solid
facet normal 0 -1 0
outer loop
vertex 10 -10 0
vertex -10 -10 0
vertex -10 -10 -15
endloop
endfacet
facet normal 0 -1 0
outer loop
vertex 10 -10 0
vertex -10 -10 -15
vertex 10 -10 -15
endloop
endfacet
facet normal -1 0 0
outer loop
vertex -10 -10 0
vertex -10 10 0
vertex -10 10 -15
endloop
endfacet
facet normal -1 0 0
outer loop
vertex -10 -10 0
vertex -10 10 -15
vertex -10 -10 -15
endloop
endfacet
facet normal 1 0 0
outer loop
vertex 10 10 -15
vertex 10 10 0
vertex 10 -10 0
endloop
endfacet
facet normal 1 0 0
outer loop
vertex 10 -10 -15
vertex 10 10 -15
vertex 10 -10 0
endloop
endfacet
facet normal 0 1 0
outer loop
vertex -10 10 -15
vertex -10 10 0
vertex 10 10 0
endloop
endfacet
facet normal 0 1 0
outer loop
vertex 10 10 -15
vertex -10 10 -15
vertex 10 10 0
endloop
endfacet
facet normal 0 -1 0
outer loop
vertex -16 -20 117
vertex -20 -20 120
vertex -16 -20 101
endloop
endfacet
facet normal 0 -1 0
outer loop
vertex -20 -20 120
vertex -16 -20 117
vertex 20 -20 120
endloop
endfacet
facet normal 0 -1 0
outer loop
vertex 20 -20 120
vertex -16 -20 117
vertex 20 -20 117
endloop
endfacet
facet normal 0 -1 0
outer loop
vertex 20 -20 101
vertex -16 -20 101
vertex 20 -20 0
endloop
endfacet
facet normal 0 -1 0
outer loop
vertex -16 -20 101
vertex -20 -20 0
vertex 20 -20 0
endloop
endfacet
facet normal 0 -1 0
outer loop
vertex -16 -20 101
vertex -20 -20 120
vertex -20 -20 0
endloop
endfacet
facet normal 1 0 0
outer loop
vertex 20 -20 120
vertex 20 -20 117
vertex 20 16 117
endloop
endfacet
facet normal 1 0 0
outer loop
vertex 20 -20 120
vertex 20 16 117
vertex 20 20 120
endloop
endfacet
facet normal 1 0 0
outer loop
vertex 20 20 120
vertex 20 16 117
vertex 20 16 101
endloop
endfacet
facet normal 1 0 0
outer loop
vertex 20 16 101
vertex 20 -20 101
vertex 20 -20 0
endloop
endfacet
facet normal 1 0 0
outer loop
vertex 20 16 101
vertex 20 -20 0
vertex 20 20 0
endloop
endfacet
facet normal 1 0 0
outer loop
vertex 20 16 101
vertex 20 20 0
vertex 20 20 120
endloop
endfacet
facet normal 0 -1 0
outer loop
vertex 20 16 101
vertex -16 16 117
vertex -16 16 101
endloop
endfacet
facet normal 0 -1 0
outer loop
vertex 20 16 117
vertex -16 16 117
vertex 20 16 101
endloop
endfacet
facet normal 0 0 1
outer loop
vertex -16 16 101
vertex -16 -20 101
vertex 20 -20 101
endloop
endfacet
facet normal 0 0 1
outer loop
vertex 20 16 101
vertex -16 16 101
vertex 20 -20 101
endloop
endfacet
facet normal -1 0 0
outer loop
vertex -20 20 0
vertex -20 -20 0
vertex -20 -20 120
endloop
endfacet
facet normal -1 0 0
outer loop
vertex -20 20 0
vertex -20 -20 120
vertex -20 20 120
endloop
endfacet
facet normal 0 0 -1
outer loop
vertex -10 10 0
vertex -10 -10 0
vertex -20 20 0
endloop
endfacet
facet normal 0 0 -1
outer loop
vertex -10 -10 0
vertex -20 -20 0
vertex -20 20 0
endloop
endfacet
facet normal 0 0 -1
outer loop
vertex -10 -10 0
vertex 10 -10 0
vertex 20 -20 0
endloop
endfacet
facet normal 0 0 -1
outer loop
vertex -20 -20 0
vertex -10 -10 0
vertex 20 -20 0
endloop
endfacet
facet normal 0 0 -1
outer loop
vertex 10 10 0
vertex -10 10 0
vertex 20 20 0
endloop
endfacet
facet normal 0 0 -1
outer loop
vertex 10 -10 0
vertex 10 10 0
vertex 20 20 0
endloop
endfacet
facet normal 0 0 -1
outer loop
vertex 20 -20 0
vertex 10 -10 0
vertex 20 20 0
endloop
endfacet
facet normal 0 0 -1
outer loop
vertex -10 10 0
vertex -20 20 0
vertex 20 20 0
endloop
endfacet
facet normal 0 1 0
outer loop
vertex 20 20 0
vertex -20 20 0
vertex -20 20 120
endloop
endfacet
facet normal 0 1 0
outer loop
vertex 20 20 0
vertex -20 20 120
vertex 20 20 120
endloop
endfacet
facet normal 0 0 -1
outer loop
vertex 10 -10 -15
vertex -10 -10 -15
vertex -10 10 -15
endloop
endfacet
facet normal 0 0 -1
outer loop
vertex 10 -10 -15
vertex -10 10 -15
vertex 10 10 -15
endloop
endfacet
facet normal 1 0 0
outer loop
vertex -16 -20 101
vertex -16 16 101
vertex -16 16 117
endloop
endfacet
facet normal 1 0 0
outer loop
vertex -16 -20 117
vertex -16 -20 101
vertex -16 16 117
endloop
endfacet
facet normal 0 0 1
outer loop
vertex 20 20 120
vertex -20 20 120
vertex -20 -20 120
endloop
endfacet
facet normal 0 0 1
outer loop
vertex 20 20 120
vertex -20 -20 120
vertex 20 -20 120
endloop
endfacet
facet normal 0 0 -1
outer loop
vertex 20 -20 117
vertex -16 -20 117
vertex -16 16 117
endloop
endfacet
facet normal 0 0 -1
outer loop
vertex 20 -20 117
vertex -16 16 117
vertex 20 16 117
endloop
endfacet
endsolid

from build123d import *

# Parameters (mm, degrees)
F0_W     = 40
F0_H     = 40
F1_DEPTH = 120
F2_W     = 36
F2_H     = 16
F3_DEPTH = 36
F4_W     = 20
F4_H     = 20
F5_DEPTH = 15


with BuildPart() as f1:
    # F0 (on Top) → F1 (new body)
    with BuildSketch(Plane.XY):
        Rectangle(F0_W, F0_H)
    extrude(amount=F1_DEPTH)

    # F2 (on face) → F3 (cut)
    with BuildSketch(Plane.XZ.offset(20)):
        with Locations((2, 109)):
            Rectangle(F2_W, F2_H)
    extrude(amount=-F3_DEPTH, mode=Mode.SUBTRACT)

    # F4 (on face) → F5 (join)
    with BuildSketch(Plane(origin=(0, 0, 0), x_dir=(1, 0, 0), z_dir=(0, 0, -1))):
        Rectangle(F4_W, F4_H)
    extrude(amount=F5_DEPTH)


solid = f1.part
